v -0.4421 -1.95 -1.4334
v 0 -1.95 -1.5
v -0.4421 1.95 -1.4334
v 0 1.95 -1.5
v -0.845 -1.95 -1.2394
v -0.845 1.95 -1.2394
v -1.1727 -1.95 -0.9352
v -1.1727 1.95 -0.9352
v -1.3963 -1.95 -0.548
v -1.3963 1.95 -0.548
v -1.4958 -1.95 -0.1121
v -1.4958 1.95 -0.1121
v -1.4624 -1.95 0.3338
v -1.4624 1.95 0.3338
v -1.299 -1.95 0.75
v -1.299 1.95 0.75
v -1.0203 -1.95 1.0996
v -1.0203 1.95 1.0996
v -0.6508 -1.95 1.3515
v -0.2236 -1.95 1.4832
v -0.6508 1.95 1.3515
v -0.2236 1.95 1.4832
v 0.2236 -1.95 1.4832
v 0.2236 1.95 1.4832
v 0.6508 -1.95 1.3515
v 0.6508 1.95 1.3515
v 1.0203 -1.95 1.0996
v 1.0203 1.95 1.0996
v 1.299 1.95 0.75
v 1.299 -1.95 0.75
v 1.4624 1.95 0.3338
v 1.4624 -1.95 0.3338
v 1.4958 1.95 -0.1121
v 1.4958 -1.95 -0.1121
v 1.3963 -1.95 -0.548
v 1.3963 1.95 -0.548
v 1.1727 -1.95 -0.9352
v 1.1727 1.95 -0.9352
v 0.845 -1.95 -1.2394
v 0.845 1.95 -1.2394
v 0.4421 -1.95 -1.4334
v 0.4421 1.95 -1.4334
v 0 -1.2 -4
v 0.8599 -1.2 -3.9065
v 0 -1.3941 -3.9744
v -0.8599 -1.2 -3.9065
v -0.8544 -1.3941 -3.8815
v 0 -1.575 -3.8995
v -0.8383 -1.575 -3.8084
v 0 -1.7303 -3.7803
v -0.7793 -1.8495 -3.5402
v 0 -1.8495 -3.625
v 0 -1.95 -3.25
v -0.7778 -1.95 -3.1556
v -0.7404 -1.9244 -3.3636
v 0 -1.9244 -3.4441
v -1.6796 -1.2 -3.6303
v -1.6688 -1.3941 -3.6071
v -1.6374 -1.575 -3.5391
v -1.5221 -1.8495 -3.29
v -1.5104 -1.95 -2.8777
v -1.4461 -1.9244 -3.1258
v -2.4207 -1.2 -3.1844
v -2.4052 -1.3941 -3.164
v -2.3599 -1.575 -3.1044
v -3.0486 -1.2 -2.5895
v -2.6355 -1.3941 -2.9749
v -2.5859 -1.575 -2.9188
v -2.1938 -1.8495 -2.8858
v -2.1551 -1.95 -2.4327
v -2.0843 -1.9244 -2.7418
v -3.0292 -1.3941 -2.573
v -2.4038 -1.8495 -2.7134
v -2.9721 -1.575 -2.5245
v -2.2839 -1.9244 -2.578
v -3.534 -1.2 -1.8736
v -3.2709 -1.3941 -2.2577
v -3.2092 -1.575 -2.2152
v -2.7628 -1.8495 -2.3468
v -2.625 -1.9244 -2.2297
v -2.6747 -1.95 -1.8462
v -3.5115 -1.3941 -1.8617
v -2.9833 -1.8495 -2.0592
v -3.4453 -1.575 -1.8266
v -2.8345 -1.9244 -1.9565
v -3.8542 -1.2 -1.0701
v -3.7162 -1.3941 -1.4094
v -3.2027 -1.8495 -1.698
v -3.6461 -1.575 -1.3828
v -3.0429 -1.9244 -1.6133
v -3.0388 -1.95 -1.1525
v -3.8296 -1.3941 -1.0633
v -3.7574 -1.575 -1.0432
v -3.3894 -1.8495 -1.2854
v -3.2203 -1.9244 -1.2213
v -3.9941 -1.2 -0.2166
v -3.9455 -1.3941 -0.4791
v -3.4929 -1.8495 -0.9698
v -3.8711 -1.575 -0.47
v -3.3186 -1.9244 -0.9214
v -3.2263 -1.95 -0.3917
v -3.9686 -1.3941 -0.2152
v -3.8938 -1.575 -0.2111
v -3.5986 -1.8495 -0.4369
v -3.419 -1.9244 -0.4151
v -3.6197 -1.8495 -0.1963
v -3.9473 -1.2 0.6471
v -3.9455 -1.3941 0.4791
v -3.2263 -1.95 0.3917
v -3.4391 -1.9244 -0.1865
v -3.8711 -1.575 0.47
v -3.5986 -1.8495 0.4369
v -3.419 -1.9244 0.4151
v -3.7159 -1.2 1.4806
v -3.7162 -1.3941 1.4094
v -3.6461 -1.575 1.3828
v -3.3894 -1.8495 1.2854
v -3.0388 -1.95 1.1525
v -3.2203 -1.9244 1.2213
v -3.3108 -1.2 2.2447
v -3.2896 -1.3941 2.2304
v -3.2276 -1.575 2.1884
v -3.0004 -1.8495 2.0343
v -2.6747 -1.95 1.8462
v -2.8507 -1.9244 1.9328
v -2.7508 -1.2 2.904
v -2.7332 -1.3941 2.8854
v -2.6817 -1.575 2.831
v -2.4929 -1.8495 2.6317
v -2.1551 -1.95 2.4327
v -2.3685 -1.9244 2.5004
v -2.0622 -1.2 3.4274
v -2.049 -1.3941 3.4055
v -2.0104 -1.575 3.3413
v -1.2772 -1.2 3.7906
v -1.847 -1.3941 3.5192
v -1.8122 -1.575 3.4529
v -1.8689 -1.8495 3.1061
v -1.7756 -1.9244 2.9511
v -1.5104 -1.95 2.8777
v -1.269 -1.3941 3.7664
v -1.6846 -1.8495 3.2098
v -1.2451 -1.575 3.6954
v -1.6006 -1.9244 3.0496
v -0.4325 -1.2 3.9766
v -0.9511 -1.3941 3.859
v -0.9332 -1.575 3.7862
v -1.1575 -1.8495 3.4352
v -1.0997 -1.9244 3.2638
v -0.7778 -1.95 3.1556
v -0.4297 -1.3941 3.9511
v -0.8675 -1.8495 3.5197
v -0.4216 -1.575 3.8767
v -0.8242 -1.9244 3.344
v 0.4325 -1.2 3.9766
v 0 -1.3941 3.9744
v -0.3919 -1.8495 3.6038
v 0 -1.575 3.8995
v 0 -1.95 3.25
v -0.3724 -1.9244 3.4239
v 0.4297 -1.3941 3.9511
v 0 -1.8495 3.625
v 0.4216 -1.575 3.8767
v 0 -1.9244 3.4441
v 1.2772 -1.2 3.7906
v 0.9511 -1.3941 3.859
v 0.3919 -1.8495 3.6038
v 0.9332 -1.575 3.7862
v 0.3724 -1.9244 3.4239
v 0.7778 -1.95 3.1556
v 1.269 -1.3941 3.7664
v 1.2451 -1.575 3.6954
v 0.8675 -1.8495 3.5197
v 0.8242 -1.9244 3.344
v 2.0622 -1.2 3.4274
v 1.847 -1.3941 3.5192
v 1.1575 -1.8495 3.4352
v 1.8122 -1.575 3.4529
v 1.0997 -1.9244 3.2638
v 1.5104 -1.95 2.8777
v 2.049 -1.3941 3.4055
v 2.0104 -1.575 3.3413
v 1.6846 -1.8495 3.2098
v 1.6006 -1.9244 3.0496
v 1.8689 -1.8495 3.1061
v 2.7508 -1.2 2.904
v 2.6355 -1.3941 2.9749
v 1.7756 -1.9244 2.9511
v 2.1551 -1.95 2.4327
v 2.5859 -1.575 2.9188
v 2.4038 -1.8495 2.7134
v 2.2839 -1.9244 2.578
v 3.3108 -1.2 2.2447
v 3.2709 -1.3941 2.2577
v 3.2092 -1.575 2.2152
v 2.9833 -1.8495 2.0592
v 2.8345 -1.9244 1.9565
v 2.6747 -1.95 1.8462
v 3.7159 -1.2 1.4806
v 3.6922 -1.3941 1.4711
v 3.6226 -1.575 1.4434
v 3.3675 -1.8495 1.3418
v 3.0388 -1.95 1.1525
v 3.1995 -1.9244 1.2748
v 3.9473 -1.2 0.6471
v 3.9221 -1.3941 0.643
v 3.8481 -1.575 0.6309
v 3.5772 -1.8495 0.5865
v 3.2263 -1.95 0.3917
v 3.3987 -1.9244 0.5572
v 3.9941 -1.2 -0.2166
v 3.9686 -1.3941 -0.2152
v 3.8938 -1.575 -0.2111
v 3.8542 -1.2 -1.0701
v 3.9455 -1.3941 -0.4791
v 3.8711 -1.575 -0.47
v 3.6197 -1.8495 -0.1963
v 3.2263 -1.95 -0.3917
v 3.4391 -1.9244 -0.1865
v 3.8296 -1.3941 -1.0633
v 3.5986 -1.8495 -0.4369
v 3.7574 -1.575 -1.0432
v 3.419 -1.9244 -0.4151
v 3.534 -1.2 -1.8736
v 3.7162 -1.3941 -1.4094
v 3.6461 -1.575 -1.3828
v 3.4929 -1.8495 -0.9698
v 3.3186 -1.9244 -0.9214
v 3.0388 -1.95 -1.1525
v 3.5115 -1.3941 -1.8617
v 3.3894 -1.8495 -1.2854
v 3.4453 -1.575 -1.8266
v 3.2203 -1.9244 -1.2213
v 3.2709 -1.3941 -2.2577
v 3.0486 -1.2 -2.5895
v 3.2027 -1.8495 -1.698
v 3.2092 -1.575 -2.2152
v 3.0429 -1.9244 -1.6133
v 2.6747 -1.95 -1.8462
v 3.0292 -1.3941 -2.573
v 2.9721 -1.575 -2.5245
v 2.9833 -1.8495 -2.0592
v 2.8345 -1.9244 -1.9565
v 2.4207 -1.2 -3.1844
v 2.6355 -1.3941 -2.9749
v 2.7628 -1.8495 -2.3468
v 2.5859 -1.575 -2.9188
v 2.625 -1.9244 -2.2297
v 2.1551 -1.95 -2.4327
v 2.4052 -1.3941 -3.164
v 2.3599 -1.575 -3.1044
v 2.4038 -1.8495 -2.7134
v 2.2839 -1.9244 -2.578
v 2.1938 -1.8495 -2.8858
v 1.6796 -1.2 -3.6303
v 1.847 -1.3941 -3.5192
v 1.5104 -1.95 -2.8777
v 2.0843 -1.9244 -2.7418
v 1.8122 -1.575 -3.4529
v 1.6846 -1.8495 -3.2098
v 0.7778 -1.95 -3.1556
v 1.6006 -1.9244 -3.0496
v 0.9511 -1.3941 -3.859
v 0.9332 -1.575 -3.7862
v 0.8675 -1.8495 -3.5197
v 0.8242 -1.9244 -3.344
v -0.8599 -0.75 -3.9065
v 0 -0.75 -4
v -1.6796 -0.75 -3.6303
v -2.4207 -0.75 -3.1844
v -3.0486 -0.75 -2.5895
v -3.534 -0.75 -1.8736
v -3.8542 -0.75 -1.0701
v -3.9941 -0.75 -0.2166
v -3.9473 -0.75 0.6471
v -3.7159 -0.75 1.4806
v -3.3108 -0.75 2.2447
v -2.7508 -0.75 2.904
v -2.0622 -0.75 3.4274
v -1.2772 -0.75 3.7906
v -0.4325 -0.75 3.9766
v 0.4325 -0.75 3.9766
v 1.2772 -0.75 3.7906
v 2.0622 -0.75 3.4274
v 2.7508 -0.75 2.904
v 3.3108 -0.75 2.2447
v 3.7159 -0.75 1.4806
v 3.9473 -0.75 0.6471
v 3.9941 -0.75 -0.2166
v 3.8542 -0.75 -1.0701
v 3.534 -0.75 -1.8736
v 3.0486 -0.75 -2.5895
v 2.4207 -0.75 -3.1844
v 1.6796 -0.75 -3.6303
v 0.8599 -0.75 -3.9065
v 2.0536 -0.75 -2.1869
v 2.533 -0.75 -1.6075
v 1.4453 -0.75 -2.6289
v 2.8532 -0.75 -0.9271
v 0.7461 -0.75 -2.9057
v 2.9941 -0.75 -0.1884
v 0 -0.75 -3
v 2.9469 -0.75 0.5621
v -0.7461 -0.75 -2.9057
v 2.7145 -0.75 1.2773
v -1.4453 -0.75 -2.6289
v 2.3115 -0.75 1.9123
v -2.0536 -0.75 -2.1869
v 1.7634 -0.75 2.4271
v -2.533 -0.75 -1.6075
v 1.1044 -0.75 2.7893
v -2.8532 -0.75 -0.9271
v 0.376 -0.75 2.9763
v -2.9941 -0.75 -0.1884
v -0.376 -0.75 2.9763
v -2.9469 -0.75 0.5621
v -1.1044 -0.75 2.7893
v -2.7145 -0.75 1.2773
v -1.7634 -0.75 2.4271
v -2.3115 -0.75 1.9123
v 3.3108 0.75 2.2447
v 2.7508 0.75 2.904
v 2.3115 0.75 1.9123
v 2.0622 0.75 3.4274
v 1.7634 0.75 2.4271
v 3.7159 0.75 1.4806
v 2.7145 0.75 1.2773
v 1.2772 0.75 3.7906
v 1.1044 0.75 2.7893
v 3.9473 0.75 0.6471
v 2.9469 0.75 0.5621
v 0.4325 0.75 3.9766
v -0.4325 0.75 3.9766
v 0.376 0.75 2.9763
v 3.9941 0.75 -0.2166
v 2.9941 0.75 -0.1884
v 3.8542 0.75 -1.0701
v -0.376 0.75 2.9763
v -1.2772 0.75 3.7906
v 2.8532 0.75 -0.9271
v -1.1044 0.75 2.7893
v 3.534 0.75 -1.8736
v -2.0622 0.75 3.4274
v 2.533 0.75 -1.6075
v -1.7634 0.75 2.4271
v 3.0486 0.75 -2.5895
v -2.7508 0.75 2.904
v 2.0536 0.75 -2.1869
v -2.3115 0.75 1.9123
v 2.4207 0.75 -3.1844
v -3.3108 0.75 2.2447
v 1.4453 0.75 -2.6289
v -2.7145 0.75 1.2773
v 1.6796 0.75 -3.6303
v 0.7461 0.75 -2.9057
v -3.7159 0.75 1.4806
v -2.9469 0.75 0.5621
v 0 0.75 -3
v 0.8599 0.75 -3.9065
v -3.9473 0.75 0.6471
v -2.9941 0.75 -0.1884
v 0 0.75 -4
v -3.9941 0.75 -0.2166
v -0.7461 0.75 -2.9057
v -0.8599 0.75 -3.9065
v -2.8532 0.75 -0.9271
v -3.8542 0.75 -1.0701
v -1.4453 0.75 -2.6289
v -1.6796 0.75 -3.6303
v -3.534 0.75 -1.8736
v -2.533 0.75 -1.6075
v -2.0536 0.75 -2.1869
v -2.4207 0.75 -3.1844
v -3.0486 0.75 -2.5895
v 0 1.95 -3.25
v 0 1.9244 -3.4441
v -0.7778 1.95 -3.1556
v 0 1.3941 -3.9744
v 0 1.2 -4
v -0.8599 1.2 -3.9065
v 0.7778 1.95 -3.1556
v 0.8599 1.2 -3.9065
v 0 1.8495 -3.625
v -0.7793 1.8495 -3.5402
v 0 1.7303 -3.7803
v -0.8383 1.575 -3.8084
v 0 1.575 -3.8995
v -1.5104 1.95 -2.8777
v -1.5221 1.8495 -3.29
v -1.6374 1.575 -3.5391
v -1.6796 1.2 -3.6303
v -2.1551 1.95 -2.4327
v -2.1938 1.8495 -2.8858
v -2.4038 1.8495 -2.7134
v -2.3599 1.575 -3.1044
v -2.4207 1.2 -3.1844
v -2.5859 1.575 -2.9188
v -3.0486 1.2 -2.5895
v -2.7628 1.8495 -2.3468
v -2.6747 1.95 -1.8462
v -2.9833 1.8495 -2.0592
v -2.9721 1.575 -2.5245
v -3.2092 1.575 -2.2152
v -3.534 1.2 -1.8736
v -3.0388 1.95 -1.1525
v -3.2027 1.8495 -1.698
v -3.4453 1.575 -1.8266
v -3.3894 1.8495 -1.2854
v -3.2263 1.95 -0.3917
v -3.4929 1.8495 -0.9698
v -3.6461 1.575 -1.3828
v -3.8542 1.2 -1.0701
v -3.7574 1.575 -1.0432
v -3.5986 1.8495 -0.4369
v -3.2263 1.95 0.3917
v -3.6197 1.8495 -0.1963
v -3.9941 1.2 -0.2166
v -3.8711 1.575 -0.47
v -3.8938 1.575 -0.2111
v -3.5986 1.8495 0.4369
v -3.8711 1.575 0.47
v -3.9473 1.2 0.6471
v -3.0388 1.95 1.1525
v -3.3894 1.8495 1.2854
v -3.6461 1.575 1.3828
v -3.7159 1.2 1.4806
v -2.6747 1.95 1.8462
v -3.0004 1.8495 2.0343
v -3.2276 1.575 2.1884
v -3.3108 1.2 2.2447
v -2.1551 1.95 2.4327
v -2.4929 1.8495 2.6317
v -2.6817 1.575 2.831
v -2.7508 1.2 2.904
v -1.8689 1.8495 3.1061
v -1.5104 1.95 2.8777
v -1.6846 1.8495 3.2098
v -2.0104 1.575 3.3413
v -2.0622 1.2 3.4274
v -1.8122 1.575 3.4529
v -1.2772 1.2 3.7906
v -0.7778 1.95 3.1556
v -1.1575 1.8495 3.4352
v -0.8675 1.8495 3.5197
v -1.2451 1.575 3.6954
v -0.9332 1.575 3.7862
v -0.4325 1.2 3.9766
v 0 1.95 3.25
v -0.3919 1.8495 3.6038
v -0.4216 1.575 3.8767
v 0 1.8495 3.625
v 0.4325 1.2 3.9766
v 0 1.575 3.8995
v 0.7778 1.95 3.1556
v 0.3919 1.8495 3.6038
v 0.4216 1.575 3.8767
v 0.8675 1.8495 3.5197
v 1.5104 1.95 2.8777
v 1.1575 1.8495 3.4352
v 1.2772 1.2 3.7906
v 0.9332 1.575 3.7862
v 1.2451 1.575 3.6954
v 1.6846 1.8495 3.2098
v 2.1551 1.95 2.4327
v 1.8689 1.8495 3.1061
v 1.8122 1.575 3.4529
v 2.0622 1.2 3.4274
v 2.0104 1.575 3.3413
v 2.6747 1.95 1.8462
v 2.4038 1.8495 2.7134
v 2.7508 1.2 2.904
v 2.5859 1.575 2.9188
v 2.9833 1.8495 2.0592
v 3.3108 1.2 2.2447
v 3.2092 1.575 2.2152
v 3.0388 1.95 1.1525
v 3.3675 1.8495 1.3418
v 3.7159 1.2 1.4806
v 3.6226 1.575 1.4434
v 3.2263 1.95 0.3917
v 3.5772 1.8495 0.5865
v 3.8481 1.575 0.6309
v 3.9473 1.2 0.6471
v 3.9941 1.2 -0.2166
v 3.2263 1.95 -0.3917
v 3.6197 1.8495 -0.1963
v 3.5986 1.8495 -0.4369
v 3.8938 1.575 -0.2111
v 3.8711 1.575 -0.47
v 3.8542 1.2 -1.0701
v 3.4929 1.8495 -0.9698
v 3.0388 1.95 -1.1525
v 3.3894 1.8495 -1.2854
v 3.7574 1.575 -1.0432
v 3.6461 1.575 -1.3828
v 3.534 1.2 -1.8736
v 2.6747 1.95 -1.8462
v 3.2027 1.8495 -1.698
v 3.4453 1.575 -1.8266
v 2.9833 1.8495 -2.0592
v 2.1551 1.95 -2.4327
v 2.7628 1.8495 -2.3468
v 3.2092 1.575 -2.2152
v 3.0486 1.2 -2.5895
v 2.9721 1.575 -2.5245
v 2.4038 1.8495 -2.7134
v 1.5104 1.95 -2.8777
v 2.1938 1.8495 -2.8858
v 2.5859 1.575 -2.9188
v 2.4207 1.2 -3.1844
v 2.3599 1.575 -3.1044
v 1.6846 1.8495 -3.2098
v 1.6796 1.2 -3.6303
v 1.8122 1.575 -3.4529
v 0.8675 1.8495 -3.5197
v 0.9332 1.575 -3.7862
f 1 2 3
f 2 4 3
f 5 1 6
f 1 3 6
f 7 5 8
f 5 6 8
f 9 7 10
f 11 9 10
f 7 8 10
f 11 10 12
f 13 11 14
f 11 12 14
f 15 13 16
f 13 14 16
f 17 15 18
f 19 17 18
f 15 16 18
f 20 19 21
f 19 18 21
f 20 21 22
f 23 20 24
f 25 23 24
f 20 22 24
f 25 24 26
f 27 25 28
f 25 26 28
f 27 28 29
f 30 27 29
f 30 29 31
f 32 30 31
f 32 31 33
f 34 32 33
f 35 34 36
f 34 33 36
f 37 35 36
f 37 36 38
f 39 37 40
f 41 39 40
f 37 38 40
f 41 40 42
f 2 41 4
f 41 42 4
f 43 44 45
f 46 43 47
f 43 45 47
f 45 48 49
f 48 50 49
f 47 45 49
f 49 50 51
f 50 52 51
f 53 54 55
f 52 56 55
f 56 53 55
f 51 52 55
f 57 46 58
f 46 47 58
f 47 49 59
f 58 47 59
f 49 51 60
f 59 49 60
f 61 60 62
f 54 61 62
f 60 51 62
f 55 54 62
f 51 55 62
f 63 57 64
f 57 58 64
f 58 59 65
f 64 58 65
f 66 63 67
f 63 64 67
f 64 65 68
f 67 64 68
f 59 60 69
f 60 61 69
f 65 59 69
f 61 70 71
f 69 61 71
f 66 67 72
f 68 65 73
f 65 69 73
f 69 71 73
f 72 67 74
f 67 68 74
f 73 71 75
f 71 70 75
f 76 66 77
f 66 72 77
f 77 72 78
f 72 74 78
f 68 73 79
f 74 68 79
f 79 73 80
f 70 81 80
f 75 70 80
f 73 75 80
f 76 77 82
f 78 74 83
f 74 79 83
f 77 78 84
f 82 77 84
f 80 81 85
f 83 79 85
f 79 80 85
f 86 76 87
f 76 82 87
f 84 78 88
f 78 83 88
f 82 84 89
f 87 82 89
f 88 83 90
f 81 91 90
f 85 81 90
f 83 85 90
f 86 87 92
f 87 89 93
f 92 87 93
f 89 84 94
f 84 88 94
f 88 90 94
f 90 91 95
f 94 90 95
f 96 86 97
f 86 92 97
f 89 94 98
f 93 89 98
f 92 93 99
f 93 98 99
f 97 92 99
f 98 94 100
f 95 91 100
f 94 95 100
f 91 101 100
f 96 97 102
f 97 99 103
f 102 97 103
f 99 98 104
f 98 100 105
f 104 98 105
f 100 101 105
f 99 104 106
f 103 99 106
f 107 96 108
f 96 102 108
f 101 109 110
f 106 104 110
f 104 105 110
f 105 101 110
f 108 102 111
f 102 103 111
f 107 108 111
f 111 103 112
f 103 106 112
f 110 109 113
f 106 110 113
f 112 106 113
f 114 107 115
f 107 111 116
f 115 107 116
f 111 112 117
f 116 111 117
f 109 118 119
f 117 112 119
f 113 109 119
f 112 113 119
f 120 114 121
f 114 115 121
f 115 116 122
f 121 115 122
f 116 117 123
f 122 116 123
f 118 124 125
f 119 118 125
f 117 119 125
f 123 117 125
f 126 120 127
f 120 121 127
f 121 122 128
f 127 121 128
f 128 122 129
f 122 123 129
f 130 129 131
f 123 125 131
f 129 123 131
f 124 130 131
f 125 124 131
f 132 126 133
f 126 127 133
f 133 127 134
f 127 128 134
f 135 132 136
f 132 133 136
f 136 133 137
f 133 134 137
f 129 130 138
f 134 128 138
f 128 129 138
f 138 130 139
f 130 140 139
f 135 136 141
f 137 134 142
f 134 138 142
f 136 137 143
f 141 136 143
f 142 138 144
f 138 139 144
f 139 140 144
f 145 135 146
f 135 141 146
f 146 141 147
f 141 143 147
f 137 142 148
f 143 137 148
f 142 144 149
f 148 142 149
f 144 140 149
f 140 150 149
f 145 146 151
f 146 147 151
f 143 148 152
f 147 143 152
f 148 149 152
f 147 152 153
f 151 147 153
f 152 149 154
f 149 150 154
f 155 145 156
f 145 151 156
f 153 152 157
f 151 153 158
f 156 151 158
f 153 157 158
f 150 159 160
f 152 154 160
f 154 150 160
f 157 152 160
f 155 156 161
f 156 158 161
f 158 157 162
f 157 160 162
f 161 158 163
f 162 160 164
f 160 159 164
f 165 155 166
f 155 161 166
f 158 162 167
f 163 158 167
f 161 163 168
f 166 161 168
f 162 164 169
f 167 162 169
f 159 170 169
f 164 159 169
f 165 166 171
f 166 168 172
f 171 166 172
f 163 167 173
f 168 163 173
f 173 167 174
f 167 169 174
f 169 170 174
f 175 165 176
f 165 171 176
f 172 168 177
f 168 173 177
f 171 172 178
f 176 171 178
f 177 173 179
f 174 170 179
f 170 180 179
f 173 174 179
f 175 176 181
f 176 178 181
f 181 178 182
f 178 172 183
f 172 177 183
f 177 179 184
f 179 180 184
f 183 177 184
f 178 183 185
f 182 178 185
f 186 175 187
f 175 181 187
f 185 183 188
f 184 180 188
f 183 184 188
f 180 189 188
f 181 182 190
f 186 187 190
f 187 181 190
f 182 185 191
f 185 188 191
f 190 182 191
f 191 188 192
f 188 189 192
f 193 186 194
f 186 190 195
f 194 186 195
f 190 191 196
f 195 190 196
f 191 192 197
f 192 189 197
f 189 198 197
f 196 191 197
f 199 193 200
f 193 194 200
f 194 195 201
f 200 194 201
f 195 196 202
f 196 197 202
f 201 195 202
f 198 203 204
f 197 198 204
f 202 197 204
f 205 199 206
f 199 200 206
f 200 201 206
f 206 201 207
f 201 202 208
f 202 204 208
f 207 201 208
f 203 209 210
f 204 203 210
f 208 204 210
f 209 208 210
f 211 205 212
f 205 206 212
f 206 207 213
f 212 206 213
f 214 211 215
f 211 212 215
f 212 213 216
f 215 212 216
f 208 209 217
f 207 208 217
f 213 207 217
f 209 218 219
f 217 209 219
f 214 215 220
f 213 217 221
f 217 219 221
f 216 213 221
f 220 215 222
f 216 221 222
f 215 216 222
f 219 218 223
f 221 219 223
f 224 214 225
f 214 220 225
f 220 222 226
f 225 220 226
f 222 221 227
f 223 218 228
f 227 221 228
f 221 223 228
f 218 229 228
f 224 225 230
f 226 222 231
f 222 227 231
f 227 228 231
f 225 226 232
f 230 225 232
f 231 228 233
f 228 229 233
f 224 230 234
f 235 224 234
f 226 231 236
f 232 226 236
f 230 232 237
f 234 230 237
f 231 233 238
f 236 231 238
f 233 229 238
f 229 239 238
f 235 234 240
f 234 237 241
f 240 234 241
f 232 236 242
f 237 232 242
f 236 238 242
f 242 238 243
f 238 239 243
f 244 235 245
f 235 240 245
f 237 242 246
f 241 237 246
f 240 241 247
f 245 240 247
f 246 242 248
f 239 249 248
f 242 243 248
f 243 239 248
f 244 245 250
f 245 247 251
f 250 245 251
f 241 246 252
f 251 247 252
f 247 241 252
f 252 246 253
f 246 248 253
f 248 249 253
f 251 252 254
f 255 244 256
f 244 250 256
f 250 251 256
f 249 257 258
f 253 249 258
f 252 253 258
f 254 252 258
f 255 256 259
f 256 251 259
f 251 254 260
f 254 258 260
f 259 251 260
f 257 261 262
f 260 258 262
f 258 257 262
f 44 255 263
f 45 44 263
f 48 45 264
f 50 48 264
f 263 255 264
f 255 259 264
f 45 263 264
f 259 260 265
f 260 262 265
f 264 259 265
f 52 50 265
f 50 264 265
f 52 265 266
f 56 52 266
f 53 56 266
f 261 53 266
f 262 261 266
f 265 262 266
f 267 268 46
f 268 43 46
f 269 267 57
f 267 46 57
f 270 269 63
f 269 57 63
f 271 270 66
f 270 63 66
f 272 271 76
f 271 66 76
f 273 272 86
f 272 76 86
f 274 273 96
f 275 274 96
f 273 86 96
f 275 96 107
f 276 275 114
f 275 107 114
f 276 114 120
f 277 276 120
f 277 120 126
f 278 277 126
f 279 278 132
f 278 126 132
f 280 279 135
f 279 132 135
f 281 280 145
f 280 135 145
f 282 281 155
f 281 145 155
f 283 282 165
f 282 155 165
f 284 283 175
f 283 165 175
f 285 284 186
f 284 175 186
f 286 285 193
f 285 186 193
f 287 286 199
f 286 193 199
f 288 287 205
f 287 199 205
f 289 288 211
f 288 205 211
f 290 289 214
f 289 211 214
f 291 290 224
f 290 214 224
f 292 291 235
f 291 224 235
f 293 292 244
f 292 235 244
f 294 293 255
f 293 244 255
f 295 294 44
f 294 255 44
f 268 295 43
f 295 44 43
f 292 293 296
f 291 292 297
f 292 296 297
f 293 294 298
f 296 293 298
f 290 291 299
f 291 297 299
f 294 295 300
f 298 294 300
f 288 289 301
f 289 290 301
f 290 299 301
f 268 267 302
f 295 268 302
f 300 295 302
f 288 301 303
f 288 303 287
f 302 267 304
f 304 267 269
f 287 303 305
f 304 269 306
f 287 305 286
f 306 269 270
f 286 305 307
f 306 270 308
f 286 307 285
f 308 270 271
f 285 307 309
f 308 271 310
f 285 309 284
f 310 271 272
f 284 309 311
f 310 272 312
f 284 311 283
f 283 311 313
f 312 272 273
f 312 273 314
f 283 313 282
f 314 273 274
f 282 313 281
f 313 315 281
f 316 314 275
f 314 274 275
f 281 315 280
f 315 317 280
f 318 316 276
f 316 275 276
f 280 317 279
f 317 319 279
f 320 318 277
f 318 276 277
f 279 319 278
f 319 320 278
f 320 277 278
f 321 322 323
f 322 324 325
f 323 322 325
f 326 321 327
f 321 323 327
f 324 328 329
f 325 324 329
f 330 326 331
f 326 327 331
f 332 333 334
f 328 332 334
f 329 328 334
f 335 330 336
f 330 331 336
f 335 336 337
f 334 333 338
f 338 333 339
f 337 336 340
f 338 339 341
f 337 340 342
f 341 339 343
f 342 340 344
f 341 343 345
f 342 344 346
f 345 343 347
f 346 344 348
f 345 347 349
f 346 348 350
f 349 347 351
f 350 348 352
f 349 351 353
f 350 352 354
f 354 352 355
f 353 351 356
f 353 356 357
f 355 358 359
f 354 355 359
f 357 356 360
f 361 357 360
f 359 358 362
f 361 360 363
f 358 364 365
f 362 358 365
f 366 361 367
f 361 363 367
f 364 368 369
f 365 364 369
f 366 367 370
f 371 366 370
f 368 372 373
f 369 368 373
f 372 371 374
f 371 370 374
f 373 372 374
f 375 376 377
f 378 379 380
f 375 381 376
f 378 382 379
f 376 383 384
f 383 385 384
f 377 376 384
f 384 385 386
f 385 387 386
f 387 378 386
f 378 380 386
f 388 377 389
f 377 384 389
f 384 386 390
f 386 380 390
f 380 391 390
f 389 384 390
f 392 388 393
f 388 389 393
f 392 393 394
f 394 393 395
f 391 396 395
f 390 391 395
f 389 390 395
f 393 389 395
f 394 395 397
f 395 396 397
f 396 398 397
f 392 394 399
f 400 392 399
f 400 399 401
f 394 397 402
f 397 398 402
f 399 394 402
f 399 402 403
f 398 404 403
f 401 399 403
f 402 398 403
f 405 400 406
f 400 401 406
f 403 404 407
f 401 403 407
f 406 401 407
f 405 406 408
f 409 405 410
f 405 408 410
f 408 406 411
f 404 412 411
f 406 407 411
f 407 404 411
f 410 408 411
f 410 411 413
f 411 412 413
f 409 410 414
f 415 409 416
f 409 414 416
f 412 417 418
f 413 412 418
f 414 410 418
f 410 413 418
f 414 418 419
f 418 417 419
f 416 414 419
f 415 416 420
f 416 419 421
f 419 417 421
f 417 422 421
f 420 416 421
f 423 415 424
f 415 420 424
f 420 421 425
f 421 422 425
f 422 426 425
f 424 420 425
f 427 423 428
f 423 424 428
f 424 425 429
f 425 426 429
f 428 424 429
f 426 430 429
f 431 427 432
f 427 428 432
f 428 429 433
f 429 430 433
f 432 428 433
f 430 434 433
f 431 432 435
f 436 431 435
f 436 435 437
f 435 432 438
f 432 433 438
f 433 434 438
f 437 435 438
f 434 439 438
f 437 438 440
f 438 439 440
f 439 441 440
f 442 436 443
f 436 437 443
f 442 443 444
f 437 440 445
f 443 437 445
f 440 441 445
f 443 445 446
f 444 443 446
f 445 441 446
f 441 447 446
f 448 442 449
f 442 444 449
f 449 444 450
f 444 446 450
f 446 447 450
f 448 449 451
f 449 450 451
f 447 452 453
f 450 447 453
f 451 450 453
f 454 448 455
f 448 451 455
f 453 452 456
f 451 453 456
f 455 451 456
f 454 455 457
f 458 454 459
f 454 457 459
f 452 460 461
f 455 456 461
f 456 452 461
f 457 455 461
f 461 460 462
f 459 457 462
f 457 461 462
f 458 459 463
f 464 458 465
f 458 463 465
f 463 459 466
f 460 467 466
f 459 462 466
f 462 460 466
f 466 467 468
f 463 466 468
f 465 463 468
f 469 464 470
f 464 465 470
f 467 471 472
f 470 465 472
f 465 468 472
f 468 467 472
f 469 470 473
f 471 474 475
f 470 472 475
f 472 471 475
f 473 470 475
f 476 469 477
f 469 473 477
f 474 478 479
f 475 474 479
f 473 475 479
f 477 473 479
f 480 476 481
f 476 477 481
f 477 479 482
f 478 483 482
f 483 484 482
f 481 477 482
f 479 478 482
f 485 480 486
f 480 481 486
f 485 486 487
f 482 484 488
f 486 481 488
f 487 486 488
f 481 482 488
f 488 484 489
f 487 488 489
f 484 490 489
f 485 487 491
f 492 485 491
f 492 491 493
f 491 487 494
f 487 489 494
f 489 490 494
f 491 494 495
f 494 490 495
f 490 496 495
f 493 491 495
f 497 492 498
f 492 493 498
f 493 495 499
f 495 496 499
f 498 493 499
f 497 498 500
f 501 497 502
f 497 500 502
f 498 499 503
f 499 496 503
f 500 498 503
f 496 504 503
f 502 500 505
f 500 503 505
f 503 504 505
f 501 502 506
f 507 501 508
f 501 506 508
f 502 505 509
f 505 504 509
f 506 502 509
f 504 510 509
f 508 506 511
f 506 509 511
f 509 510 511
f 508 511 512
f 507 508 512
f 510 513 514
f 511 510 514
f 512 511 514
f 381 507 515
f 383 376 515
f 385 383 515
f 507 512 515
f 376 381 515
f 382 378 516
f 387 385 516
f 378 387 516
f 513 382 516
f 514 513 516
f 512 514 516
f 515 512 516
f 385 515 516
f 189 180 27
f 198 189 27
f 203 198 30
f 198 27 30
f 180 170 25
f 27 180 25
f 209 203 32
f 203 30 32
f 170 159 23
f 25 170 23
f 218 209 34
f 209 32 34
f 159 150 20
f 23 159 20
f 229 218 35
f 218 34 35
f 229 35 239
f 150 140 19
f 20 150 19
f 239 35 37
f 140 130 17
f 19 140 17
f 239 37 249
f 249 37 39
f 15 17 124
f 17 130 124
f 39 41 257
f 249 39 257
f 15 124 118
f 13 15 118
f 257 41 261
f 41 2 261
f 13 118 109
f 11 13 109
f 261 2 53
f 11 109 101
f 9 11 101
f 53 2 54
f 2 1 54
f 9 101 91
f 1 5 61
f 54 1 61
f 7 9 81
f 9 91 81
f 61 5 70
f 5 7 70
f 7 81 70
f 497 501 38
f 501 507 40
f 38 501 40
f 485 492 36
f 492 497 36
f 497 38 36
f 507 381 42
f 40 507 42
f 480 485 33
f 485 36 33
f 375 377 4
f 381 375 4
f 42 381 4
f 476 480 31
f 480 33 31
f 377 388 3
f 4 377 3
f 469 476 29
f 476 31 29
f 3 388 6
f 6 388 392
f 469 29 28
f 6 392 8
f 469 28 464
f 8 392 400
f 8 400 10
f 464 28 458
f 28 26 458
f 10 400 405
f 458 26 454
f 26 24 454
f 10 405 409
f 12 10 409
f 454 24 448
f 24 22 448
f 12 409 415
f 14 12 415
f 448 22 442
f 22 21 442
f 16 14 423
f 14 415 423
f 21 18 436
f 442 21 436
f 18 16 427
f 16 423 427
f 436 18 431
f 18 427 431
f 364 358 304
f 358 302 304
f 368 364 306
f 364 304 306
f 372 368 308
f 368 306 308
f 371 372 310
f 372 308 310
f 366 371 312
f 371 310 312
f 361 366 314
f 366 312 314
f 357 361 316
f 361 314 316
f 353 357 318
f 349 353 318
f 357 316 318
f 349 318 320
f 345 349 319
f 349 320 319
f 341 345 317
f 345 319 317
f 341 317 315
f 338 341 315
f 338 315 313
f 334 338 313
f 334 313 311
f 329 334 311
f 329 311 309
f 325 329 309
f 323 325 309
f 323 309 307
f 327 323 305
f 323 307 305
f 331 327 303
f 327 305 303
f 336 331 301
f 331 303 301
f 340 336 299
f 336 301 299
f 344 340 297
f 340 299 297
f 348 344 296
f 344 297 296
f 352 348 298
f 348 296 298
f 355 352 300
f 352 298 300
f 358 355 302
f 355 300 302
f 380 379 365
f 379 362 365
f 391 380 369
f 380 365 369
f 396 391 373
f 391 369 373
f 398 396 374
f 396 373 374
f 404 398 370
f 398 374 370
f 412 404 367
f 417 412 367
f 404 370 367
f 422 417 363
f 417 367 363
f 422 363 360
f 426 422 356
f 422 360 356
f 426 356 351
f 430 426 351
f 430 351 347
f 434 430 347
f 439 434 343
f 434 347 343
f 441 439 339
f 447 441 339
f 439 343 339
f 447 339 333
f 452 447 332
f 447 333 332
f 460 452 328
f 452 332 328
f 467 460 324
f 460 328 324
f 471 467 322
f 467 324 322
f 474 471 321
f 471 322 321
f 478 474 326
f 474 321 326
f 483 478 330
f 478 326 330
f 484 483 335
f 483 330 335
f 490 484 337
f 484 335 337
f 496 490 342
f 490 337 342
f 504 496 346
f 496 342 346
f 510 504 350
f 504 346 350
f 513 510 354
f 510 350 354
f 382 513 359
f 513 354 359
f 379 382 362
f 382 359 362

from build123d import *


with BuildPart() as part:
    # Sketch1 → Revolve1 (revolve)
    with BuildSketch(Plane(origin=(0, 0, 0), x_dir=(0, 0, -1), z_dir=(1, 0, 0)), mode=Mode.PRIVATE) as revolve1_sk:
        with BuildLine():
            Line((-1.5, -1.95), (-1.5, 1.95))
            Line((-1.5, 1.95), (-3.25, 1.95))
            ThreePointArc((-3.25, 1.95), (-3.780330086, 1.730330086), (-4, 1.2))
            Line((-4, 1.2), (-4, 0.75))
            Line((-4, 0.75), (-3, 0.75))
            Line((-3, 0.75), (-3, -0.75))
            Line((-3, -0.75), (-4, -0.75))
            Line((-4, -0.75), (-4, -1.2))
            ThreePointArc((-4, -1.2), (-3.780330086, -1.730330086), (-3.25, -1.95))
            Line((-3.25, -1.95), (-1.5, -1.95))
        make_face()
    revolve(revolve1_sk.sketch.rotate(Axis((0, 0, 0), (0, 1, 0)), 180), axis=Axis((0, 0, 0), (0, 1, 0)))


solid = part.part
